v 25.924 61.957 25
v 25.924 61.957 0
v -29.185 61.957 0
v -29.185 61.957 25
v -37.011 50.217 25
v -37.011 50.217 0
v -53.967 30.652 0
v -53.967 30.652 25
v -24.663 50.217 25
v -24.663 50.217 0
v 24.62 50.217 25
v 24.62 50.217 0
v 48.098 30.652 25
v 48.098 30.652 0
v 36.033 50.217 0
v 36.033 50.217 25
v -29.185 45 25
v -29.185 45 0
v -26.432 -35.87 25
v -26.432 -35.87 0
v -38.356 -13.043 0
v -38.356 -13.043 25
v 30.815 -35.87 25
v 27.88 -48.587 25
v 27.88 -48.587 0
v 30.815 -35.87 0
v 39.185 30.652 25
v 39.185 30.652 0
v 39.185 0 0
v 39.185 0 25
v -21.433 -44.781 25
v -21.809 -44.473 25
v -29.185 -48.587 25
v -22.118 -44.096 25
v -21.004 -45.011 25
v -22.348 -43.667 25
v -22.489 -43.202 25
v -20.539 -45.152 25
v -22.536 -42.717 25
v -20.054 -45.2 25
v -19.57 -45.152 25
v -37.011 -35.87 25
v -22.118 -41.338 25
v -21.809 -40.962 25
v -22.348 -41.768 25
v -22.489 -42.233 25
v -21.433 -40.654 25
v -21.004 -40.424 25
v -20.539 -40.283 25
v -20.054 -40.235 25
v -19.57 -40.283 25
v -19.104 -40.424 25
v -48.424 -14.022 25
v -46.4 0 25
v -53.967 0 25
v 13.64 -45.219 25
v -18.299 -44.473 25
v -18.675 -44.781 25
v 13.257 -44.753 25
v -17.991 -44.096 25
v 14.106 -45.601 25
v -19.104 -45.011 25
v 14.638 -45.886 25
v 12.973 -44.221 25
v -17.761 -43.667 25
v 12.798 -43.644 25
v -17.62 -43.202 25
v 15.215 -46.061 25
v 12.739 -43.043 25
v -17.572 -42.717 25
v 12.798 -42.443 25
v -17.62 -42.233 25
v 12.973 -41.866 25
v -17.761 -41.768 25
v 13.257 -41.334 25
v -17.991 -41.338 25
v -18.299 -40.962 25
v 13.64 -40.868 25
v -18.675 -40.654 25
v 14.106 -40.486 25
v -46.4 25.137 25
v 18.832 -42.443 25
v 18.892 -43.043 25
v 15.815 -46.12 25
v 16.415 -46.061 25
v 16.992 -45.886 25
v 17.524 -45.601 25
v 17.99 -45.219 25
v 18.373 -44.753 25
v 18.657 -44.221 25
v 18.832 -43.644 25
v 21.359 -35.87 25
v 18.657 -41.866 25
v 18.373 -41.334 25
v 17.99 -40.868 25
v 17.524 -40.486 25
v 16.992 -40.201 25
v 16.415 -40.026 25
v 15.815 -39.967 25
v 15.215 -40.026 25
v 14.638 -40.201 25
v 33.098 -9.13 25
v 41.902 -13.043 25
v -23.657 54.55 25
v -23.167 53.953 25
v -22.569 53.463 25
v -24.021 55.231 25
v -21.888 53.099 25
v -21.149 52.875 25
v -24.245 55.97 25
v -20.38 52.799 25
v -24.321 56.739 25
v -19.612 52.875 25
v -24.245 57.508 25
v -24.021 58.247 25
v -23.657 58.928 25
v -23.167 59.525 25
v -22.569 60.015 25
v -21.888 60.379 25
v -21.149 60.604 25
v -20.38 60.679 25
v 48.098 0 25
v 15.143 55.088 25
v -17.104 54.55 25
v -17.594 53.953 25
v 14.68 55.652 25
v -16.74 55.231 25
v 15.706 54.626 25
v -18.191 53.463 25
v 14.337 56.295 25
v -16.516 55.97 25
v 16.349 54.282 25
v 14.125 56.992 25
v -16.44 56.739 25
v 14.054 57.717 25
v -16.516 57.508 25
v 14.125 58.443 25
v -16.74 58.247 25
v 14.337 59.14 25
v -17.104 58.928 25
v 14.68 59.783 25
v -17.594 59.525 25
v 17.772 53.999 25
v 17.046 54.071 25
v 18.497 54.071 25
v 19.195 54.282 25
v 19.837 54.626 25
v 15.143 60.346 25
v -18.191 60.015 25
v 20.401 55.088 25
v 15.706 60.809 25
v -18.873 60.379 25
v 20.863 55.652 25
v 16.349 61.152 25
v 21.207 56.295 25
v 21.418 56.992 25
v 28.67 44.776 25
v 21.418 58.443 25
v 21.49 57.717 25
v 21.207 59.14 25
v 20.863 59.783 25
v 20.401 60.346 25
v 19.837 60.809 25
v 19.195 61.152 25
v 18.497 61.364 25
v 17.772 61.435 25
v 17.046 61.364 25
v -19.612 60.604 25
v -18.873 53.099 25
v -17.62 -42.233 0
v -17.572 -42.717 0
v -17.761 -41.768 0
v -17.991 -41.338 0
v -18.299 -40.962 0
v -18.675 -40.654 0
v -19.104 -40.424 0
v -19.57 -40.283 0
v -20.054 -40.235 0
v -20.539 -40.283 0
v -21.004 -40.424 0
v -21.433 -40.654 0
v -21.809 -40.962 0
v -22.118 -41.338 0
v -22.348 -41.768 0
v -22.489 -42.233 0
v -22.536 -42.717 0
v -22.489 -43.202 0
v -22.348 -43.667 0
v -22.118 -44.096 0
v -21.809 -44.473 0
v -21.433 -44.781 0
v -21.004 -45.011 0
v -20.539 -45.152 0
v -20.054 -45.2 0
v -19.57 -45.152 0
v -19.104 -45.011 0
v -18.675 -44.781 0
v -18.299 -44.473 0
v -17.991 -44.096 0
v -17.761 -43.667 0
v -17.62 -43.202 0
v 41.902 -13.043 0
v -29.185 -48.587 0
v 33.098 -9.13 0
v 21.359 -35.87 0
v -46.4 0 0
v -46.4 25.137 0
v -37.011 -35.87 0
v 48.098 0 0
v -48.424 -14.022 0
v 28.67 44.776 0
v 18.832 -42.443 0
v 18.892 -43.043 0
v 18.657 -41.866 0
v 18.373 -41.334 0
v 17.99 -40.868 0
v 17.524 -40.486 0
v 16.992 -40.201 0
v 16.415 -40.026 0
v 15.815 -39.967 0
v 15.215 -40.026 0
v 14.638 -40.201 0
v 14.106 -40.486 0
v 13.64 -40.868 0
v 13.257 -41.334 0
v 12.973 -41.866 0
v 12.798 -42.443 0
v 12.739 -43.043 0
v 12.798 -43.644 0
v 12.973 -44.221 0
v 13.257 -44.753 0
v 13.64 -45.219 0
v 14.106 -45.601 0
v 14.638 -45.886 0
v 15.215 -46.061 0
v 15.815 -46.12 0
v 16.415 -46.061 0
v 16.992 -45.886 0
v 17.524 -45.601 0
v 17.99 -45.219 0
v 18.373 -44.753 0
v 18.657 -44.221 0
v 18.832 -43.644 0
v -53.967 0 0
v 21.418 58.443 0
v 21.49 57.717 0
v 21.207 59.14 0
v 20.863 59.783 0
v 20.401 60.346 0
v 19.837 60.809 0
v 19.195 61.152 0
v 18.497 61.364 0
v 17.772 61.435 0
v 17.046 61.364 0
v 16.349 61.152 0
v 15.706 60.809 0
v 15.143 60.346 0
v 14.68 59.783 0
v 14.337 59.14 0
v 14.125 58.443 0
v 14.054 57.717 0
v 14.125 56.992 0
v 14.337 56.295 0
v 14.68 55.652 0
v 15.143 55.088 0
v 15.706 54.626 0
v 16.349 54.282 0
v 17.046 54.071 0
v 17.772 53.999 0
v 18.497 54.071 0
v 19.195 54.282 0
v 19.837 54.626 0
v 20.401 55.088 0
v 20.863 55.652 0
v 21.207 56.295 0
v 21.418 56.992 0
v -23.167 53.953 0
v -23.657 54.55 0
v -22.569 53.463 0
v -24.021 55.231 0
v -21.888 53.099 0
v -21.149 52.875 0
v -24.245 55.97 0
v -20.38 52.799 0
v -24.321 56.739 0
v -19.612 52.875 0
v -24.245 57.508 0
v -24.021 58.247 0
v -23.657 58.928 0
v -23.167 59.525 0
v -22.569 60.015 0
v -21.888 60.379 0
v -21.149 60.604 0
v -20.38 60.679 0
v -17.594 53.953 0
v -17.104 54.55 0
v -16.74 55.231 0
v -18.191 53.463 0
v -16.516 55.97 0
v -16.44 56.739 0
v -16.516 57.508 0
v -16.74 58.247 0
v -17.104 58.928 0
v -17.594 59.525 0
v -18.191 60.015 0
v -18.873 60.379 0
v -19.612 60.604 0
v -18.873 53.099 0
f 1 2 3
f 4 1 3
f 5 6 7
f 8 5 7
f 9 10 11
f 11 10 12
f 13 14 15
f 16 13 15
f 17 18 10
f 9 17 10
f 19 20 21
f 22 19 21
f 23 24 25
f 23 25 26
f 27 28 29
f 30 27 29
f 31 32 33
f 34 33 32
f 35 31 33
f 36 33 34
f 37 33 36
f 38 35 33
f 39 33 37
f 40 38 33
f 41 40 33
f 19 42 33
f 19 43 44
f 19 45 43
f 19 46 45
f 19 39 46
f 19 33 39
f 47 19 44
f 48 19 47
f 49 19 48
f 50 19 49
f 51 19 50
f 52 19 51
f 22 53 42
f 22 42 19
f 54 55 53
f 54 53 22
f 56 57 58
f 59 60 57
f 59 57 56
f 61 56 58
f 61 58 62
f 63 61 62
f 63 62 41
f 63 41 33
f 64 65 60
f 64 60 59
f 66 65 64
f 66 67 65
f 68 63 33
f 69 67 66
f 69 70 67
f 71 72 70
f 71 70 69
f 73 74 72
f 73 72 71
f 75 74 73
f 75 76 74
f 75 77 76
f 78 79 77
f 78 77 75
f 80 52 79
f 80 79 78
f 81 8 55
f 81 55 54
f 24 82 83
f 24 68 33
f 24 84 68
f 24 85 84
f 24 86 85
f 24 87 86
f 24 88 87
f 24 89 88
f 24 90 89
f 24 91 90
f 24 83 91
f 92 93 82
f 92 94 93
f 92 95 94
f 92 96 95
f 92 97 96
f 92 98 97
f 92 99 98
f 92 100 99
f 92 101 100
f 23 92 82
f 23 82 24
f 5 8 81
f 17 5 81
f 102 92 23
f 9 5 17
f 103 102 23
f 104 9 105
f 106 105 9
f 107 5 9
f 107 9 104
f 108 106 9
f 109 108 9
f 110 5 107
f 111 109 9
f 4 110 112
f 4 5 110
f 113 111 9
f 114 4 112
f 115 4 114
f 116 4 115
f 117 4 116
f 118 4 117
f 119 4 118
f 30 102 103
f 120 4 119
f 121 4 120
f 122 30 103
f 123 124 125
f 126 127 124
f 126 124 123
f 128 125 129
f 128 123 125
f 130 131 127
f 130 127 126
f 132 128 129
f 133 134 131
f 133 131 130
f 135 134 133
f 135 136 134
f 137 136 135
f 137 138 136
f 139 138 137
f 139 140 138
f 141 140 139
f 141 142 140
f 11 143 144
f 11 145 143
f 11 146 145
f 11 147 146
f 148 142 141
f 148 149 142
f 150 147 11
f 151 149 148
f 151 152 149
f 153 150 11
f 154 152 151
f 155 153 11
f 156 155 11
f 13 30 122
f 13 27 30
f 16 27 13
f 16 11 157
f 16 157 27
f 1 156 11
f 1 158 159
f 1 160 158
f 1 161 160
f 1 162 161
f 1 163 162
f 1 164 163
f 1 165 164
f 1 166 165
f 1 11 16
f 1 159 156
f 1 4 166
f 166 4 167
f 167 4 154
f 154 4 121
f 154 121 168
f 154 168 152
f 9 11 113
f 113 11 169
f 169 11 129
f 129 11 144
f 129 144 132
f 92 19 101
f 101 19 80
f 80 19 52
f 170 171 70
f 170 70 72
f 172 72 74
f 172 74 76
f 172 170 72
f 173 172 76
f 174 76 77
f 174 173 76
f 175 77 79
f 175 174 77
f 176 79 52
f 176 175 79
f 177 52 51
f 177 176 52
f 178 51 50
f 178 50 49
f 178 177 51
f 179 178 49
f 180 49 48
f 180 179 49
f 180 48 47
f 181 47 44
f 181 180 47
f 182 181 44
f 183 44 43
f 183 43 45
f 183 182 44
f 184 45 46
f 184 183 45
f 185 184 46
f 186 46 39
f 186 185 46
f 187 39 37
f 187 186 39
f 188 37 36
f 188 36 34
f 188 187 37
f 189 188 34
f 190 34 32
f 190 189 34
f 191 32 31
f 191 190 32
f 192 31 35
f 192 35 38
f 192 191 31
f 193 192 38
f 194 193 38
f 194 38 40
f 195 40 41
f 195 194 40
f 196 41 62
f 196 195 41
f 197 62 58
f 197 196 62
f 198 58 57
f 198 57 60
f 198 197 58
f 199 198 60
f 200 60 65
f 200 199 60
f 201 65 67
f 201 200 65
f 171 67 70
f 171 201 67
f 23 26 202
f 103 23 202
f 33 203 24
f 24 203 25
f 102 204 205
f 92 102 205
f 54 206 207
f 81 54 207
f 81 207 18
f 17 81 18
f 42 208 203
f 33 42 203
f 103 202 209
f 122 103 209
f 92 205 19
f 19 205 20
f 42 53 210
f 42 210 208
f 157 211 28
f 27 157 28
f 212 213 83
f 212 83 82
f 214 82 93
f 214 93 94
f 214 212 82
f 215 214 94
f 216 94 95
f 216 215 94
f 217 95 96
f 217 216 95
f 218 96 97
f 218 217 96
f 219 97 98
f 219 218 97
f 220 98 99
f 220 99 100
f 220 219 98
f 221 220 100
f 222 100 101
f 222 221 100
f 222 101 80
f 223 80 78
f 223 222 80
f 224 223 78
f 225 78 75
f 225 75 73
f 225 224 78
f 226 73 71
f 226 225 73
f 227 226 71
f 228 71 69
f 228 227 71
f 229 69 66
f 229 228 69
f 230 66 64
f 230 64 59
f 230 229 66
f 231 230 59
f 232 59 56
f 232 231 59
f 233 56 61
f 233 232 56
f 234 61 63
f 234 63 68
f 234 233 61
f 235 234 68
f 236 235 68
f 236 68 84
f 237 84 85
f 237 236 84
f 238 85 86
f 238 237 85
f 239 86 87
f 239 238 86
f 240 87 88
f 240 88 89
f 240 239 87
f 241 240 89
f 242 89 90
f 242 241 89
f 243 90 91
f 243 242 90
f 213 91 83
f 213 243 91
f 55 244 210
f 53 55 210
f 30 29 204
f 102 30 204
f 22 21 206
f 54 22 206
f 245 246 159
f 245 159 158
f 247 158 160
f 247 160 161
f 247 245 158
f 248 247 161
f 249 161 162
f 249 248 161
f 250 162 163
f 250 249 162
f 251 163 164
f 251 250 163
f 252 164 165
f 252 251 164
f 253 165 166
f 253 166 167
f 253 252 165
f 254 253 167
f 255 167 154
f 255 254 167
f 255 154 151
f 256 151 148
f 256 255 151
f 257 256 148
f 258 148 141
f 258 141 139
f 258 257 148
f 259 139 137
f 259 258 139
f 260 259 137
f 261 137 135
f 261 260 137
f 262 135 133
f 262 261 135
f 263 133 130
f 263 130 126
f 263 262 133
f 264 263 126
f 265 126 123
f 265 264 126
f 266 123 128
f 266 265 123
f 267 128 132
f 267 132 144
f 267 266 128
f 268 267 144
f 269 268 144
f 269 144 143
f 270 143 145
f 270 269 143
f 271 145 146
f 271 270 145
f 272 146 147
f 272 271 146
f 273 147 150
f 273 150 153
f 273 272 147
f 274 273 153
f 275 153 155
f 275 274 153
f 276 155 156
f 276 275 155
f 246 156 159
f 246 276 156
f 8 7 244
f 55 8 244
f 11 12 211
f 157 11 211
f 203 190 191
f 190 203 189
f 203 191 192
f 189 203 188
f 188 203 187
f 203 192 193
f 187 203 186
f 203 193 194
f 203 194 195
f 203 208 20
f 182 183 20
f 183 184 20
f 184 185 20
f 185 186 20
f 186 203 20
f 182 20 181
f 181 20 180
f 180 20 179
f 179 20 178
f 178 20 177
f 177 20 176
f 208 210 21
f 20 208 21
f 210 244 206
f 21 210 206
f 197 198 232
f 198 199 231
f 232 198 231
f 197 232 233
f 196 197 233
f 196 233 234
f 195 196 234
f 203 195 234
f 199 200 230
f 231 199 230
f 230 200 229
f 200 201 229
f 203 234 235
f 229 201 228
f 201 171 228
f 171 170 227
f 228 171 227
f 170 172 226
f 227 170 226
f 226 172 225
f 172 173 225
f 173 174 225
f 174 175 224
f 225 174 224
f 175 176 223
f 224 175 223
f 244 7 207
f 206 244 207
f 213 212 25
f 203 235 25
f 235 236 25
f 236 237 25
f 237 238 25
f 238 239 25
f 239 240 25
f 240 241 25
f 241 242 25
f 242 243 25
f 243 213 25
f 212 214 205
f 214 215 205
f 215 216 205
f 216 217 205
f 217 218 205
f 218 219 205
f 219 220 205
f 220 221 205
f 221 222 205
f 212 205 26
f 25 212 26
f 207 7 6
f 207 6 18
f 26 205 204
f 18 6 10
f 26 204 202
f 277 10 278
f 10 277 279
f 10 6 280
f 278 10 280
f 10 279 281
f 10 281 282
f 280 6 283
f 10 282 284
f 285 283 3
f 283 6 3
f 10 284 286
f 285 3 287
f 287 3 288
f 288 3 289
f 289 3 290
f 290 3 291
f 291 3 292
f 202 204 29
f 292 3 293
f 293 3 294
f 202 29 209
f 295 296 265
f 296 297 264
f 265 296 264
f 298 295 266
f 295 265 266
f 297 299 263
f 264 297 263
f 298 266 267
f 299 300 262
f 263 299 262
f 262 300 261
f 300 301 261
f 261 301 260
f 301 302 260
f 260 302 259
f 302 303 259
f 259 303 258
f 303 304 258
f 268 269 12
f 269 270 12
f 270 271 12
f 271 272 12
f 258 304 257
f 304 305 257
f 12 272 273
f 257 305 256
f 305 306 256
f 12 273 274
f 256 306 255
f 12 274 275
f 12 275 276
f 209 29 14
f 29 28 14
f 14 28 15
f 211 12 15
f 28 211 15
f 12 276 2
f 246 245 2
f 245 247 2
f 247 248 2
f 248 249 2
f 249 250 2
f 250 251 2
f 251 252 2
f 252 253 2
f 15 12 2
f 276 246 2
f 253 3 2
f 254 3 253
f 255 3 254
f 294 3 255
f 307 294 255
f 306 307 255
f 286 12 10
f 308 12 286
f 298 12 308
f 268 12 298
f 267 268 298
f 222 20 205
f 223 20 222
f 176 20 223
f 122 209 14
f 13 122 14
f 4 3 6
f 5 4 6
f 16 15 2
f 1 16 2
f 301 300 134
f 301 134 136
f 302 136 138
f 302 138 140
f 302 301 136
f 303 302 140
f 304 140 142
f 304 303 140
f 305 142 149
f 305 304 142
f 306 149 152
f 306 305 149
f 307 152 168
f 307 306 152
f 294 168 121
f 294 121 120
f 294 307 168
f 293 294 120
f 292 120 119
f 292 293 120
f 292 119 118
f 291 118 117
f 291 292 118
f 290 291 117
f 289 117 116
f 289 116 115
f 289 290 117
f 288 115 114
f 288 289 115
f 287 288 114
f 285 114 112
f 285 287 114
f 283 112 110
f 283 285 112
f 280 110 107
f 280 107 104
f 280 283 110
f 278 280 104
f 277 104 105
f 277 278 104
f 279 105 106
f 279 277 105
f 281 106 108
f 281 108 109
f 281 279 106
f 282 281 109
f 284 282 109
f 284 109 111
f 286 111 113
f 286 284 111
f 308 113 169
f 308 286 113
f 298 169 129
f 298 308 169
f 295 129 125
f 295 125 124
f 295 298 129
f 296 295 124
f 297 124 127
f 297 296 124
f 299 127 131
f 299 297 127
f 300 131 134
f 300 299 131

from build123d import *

# Parameters (mm, degrees)
F0_R     = 3.9401235554
F0_R_2   = 3.7179654295
F0_R_3   = 2.4821275962
F0_R_4   = 3.0762994678
F1_DEPTH = 25


with BuildPart() as f1:
    # F0 (on Top) → F1 (new body)
    with BuildSketch(Plane.XY):
        Polygon((25.9239133447, 61.9565248489), (-29.1847828776, 61.9565248489), (-37.0108708739, 50.2173937857), (-24.6630428207, 50.2173937857), (24.6195662767, 50.2173937857), (36.0326059163, 50.2173937857), align=None)
        with Locations((-20.3804355115, 56.7391328514)):
            Circle(F0_R, mode=Mode.SUBTRACT)
        with Locations((17.7717413753, 57.7173940837)):
            Circle(F0_R_2, mode=Mode.SUBTRACT)
        Polygon((-29.1847828776, 45.0000013742), (-37.0108708739, 50.2173937857), (-53.9673939347, 30.6521747261), (-46.3995258629, 25.1368362456), align=None)
        Polygon((-24.6630428207, 50.2173937857), (-37.0108708739, 50.2173937857), (-29.1847828776, 45.0000013742), align=None)
        Polygon((28.6701515291, 44.7763084559), (36.0326059163, 50.2173937857), (24.6195662767, 50.2173937857), align=None)
        Polygon((48.0978302658, 30.6521747261), (36.0326059163, 50.2173937857), (28.6701515291, 44.7763084559), (39.184783137, 30.6521747261), (39.184783137, 0), (33.0978259444, -9.1304350644), (21.3586967438, -35.8695648611), (30.815217644, -35.8695648611), (41.9021770358, -13.0434790626), (48.0978302658, 0), align=None)
        Polygon((-46.3995258629, 25.1368362456), (-53.9673939347, 30.6521747261), (-53.9673939347, 0), (-48.4239161015, -14.0217393637), (-37.0108708739, -35.8695648611), (-26.4319663345, -35.8695648611), (-38.3560431547, -13.0434790626), (-46.3995258629, 0), align=None)
        Polygon((-26.4319663345, -35.8695648611), (-37.0108708739, -35.8695648611), (-29.1847828776, -48.5869571567), (27.8804339468, -48.5869571567), (30.815217644, -35.8695648611), (21.3586967438, -35.8695648611), align=None)
        with Locations((-20.0543478131, -42.7173897624)):
            Circle(F0_R_3, mode=Mode.SUBTRACT)
        with Locations((15.8152170479, -43.0434793234)):
            Circle(F0_R_4, mode=Mode.SUBTRACT)
    extrude(amount=F1_DEPTH)


solid = f1.part
